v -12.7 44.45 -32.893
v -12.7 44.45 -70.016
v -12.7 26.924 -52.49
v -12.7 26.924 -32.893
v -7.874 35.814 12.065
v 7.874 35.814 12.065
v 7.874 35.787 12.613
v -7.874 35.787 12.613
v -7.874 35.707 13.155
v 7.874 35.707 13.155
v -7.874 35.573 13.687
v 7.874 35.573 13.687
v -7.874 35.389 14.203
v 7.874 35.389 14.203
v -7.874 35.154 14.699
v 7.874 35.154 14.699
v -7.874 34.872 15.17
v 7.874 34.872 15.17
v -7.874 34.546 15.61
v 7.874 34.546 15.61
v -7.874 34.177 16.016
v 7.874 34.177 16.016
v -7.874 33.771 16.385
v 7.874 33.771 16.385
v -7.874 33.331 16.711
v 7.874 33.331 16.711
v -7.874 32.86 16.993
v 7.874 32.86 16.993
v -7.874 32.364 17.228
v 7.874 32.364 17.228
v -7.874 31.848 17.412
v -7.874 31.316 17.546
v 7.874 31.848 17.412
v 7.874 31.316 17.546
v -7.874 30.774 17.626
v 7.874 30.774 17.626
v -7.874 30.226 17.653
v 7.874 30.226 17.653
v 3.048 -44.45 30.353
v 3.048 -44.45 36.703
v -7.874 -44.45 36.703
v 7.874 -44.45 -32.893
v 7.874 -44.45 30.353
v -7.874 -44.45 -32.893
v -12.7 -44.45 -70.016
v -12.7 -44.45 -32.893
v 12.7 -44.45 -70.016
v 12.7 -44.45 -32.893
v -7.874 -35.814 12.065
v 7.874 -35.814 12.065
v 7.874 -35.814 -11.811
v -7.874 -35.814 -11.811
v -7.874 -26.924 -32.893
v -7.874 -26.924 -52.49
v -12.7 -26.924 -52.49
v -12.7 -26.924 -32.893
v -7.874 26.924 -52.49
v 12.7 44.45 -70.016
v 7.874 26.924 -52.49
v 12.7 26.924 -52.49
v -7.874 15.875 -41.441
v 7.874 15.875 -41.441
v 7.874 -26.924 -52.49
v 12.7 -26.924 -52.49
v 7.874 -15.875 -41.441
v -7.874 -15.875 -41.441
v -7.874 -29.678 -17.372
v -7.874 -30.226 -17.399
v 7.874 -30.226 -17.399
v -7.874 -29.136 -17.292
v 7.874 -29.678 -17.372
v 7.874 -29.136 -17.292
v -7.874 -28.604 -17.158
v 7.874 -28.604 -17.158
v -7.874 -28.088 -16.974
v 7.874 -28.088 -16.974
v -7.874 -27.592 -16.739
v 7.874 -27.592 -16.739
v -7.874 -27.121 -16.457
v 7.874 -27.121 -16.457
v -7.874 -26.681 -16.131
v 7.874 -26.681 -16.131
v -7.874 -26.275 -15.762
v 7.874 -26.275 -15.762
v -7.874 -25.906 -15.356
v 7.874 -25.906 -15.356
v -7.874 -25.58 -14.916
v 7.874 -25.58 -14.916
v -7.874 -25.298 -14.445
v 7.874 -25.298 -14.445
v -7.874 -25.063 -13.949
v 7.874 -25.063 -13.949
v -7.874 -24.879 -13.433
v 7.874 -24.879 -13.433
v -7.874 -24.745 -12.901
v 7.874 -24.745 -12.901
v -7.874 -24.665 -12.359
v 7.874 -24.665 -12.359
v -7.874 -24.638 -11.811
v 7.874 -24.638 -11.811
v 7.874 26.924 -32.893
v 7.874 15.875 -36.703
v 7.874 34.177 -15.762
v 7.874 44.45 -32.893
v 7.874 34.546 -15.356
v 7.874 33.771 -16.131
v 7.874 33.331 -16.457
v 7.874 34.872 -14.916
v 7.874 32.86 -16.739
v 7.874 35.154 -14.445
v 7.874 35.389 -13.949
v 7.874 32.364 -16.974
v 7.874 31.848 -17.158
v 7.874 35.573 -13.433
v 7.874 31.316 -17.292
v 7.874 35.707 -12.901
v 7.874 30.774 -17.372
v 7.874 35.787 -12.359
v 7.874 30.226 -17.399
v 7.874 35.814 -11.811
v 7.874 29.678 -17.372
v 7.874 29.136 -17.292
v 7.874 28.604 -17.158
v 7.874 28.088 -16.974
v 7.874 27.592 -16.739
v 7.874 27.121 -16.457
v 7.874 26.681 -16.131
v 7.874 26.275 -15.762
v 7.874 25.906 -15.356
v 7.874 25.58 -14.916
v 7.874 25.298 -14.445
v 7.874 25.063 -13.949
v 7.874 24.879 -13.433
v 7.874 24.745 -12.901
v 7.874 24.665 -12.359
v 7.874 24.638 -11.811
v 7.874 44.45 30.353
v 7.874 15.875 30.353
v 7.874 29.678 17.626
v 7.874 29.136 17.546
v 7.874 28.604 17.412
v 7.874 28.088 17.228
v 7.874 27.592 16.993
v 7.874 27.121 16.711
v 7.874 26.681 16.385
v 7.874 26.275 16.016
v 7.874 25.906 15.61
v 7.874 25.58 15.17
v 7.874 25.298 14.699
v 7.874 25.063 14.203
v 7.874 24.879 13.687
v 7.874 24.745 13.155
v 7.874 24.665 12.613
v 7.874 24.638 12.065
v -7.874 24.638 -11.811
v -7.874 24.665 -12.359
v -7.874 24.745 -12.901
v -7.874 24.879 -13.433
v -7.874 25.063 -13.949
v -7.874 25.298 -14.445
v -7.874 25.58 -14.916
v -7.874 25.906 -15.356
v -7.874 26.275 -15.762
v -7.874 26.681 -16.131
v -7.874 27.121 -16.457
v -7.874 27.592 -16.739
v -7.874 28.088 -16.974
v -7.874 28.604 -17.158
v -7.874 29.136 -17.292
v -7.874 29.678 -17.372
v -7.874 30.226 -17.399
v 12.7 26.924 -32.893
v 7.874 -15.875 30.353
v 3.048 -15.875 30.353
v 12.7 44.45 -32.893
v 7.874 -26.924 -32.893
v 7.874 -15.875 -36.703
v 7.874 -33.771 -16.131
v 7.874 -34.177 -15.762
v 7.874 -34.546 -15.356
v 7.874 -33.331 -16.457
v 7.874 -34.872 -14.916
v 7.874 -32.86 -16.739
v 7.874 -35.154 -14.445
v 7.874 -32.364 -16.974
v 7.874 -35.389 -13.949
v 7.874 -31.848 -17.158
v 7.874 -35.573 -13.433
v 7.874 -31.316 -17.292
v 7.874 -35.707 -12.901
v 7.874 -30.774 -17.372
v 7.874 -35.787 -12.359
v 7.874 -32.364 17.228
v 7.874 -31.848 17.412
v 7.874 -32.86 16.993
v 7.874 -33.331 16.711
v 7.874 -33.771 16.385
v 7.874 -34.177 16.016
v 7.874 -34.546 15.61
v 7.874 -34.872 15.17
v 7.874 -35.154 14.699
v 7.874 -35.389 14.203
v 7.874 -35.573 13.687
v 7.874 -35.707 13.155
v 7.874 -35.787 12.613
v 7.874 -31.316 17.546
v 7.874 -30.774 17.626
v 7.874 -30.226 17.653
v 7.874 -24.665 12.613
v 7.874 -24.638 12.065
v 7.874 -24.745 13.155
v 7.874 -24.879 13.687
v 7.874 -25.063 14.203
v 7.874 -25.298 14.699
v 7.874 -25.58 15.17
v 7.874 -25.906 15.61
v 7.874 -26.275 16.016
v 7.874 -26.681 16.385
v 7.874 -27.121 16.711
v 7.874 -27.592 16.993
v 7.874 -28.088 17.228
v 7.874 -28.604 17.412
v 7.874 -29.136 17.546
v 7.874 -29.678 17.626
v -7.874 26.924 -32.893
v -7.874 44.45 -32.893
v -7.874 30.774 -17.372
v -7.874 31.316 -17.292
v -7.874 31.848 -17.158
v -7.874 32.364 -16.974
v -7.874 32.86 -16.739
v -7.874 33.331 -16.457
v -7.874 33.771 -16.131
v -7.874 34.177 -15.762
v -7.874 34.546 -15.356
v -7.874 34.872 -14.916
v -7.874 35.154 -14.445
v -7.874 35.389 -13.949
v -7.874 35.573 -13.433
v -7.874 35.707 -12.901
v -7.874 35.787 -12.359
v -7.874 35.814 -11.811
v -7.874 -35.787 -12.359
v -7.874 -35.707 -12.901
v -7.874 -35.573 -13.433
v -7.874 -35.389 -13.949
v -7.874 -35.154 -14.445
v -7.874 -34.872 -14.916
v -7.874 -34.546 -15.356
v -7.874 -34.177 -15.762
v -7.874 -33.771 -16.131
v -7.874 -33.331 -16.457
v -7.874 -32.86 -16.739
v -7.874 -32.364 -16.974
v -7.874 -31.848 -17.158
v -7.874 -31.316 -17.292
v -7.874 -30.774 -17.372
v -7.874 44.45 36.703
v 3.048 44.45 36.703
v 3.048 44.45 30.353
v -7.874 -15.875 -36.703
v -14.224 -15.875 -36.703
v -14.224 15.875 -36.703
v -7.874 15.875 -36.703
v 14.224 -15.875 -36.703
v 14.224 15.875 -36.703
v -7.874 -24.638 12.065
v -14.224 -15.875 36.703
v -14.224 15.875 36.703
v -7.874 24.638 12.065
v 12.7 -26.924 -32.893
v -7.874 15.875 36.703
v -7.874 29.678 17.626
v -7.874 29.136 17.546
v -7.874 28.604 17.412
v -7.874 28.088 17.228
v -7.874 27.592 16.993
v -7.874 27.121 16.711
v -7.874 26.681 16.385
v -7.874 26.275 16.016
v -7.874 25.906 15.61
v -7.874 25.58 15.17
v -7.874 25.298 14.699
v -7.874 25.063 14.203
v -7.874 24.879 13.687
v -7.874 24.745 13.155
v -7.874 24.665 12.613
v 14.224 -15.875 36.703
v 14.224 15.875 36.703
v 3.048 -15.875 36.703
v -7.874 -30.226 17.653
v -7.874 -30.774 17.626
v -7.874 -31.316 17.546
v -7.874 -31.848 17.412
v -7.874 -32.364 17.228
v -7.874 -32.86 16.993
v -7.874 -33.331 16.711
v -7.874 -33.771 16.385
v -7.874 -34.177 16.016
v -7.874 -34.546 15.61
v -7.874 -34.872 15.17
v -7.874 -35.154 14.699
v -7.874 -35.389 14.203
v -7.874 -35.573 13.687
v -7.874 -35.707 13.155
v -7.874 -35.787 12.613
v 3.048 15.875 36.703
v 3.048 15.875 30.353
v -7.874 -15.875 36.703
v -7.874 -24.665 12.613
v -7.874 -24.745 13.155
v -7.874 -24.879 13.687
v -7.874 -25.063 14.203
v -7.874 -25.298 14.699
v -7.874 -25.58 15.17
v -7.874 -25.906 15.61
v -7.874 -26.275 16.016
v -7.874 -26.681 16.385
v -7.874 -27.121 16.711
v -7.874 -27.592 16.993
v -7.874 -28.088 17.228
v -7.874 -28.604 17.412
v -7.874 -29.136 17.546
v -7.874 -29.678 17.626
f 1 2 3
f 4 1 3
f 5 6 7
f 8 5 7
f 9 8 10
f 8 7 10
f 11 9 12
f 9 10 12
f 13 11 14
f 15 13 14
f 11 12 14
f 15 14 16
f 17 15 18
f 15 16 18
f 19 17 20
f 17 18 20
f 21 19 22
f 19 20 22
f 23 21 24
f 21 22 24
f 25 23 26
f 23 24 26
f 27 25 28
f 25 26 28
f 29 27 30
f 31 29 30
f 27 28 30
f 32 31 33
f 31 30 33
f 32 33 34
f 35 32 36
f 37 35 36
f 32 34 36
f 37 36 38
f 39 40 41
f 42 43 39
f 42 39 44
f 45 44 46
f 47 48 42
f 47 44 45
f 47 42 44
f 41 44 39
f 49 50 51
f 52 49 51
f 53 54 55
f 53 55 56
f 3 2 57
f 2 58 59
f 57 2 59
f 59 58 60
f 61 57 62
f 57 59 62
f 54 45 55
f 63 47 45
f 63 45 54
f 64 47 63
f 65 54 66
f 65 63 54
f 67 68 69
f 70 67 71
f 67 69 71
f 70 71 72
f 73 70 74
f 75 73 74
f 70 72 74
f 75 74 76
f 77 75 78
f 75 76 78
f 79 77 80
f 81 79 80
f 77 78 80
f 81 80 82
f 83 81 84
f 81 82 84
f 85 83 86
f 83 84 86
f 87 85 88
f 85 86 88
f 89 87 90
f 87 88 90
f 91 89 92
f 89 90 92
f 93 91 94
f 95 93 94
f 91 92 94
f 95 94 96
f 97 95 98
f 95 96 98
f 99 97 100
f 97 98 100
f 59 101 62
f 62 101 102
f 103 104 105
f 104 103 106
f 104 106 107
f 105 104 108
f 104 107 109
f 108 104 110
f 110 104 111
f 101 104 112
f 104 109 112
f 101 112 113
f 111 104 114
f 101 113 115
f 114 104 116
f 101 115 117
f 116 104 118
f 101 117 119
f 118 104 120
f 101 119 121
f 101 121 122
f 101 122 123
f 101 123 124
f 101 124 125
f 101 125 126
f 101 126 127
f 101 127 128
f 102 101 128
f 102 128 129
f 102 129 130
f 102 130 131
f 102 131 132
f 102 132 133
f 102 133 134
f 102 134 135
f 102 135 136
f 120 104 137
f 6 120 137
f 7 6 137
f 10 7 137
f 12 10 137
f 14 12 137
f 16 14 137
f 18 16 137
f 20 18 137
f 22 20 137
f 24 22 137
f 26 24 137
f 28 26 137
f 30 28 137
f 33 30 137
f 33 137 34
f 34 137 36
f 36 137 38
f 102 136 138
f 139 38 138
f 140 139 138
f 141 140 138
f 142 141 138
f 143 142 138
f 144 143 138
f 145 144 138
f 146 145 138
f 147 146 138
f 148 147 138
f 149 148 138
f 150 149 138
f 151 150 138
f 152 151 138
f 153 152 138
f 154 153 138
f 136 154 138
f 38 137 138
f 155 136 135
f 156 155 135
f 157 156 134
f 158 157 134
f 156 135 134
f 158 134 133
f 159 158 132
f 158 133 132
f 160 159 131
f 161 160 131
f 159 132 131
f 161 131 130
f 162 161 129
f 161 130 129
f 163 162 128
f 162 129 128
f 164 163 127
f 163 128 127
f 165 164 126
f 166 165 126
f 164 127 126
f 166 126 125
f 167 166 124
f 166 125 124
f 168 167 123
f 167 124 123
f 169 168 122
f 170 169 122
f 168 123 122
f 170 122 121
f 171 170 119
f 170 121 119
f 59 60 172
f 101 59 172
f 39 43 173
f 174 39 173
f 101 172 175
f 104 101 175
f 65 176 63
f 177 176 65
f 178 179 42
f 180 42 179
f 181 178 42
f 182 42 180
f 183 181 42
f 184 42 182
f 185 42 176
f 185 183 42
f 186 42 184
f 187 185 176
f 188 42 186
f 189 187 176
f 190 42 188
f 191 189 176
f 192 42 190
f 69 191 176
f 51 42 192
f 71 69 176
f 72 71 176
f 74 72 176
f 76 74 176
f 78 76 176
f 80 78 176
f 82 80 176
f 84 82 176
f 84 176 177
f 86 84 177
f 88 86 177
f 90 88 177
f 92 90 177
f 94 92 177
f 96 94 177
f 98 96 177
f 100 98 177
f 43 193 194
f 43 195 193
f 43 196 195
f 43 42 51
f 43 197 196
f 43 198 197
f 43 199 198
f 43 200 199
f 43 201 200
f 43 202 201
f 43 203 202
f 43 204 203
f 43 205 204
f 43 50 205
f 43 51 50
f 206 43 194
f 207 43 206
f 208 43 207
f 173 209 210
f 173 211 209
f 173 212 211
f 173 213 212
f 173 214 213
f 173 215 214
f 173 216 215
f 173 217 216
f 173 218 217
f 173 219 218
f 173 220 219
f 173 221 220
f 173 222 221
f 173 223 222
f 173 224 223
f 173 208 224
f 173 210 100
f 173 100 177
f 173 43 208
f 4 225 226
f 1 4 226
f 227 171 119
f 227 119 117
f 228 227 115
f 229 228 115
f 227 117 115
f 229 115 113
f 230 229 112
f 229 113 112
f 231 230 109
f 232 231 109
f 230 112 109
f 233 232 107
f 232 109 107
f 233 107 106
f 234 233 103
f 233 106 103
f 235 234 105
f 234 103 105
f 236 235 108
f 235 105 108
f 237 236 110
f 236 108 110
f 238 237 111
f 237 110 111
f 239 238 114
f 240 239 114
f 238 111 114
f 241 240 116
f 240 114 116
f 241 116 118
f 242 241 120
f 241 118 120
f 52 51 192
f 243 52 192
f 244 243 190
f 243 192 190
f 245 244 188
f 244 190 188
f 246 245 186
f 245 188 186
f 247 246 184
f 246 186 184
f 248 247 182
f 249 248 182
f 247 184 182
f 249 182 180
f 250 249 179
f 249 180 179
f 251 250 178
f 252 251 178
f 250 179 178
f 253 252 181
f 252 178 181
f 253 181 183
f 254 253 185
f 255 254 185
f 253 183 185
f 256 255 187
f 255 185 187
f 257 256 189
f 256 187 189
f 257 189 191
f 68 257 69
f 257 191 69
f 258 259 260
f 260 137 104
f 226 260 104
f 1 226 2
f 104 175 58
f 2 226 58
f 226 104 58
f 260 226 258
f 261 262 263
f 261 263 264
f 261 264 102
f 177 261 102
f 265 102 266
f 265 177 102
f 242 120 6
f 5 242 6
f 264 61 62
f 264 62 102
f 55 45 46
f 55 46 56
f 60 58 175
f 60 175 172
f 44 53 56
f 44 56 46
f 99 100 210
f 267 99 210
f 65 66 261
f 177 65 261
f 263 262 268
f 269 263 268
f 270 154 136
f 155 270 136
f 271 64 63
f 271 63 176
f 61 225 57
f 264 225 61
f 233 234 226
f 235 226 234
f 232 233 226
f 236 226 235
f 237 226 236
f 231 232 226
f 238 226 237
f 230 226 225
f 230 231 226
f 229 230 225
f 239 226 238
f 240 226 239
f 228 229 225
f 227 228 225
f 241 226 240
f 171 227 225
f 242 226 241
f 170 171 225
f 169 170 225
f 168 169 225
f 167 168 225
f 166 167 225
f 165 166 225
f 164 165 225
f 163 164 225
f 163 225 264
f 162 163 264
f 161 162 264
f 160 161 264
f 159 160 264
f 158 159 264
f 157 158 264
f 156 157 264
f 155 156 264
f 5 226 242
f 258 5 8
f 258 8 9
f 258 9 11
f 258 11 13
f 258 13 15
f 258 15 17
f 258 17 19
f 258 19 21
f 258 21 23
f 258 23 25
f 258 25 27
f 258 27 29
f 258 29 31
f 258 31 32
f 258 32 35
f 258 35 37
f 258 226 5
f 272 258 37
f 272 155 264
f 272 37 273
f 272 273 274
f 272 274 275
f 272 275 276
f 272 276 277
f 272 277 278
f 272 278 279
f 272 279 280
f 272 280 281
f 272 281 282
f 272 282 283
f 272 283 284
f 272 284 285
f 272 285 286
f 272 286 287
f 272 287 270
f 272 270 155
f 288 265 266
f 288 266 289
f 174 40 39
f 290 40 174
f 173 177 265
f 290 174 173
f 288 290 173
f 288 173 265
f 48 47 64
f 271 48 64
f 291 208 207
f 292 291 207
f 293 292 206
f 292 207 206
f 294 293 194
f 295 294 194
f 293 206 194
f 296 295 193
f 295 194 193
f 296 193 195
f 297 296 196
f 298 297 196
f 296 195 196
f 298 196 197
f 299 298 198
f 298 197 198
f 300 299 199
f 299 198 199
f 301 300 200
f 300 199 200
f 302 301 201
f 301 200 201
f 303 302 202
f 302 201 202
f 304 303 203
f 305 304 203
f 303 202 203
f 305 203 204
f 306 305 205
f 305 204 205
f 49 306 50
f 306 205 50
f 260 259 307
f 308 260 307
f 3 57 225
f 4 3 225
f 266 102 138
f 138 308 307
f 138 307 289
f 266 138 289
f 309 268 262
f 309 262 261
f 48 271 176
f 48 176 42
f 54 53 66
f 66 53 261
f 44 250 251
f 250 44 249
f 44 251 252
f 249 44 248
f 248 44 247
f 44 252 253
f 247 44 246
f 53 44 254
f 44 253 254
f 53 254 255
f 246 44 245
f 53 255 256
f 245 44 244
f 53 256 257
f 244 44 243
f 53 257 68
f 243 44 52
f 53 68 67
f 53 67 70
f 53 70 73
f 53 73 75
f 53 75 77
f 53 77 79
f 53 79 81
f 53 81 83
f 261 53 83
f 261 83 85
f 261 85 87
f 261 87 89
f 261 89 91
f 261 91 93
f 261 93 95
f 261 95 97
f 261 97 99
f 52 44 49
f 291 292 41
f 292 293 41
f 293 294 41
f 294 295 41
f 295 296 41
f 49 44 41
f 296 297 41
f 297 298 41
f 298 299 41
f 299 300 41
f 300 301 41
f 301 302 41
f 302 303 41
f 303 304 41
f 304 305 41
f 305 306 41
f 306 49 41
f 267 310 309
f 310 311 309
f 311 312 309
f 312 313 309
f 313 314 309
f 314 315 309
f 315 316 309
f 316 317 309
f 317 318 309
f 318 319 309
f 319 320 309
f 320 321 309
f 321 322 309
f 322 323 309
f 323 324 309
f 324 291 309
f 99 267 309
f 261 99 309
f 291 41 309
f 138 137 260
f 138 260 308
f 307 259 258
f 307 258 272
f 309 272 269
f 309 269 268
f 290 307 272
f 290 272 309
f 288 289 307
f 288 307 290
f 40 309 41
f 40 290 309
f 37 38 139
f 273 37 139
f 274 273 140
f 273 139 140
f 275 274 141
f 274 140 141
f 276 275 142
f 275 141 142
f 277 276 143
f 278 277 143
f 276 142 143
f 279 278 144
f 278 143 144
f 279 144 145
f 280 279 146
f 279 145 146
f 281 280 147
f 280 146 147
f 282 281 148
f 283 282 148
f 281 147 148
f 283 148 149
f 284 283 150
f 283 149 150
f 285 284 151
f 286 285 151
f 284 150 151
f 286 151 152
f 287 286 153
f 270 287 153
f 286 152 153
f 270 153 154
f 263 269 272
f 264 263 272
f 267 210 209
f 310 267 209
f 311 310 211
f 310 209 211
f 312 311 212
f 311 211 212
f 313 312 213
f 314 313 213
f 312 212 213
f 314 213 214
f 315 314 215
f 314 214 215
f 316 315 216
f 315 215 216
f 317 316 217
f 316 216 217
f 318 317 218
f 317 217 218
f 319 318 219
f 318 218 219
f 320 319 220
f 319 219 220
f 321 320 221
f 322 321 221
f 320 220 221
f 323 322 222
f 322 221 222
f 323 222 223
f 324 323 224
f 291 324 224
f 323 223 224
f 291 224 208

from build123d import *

# Parameters (mm, degrees)
F0_W      = 28.448
F0_H      = 73.406
F1_DEPTH  = 15.875
F2_W      = 28.575
F2_H      = 6.35
F3_DEPTH  = 7.874
F5_W      = 28.575
F5_H      = 6.35
F6_DEPTH  = 4.826
F8_DEPTH  = 12.7
F12_DEPTH = 40.132


with BuildPart() as f1:
    # F0 (on Front) → F1 (new body, symmetric)
    with BuildSketch(Plane.XZ):
        Rectangle(F0_W, F0_H)
    extrude(amount=F1_DEPTH, both=True)

    # F2 (on Right) → F3 (join, symmetric)
    with BuildSketch(Plane.YZ):
        Polygon((-15.875, -36.703), (-15.875, 30.353), (-44.45, 30.353), (-44.45, -32.893), (-26.924, -32.893), (-26.924, -52.4899314183), (-15.875, -41.4409314183), align=None)
        with Locations((-30.1625, 33.528)):
            Rectangle(F2_W, F2_H)
    extrude(amount=F3_DEPTH, both=True)

    # F5 (on offset) → F6 (cut)
    with BuildSketch(Plane.YZ.offset(7.874)):
        with Locations((-30.1625, 33.528)):
            Rectangle(F5_W, F5_H)
    extrude(amount=-F6_DEPTH, mode=Mode.SUBTRACT)

    # F7 (on Right) → F8 (join, symmetric)
    with BuildSketch(Plane.YZ):
        Polygon((-26.924, -32.893), (-44.45, -32.893), (-44.45, -70.0159314183), (-26.924, -52.4899314183), align=None)
    extrude(amount=F8_DEPTH, both=True)

    # F10: F1 across plane


with BuildPart() as f1_1:
    add(f1.part)
    add(f1.part.mirror(Plane.XZ))

    # F11 (on offset) → F12 (cut)
    with BuildSketch(Plane.YZ.offset(7.874)):
        with BuildLine():
            ThreePointArc((-30.226, 17.653), (-34.1773126933, 16.0163126933), (-35.814, 12.065))
            Line((-35.814, 12.065), (-35.814, -11.811))
            ThreePointArc((-35.814, -11.811), (-34.1773126933, -15.7623126933), (-30.226, -17.399))
            ThreePointArc((-30.226, -17.399), (-26.2746873067, -15.7623126933), (-24.638, -11.811))
            Line((-24.638, -11.811), (-24.638, 12.065))
            ThreePointArc((-24.638, 12.065), (-26.2746873067, 16.0163126933), (-30.226, 17.653))
        make_face()
        with BuildLine():
            ThreePointArc((30.226, -17.399), (34.1773126933, -15.7623126933), (35.814, -11.811))
            Line((35.814, -11.811), (35.814, 12.065))
            ThreePointArc((35.814, 12.065), (34.1773126933, 16.0163126933), (30.226, 17.653))
            ThreePointArc((30.226, 17.653), (26.2746873067, 16.0163126933), (24.638, 12.065))
            Line((24.638, 12.065), (24.638, -11.811))
            ThreePointArc((24.638, -11.811), (26.2746873067, -15.7623126933), (30.226, -17.399))
        make_face()
    extrude(amount=-F12_DEPTH, mode=Mode.SUBTRACT)


solid = f1_1.part
